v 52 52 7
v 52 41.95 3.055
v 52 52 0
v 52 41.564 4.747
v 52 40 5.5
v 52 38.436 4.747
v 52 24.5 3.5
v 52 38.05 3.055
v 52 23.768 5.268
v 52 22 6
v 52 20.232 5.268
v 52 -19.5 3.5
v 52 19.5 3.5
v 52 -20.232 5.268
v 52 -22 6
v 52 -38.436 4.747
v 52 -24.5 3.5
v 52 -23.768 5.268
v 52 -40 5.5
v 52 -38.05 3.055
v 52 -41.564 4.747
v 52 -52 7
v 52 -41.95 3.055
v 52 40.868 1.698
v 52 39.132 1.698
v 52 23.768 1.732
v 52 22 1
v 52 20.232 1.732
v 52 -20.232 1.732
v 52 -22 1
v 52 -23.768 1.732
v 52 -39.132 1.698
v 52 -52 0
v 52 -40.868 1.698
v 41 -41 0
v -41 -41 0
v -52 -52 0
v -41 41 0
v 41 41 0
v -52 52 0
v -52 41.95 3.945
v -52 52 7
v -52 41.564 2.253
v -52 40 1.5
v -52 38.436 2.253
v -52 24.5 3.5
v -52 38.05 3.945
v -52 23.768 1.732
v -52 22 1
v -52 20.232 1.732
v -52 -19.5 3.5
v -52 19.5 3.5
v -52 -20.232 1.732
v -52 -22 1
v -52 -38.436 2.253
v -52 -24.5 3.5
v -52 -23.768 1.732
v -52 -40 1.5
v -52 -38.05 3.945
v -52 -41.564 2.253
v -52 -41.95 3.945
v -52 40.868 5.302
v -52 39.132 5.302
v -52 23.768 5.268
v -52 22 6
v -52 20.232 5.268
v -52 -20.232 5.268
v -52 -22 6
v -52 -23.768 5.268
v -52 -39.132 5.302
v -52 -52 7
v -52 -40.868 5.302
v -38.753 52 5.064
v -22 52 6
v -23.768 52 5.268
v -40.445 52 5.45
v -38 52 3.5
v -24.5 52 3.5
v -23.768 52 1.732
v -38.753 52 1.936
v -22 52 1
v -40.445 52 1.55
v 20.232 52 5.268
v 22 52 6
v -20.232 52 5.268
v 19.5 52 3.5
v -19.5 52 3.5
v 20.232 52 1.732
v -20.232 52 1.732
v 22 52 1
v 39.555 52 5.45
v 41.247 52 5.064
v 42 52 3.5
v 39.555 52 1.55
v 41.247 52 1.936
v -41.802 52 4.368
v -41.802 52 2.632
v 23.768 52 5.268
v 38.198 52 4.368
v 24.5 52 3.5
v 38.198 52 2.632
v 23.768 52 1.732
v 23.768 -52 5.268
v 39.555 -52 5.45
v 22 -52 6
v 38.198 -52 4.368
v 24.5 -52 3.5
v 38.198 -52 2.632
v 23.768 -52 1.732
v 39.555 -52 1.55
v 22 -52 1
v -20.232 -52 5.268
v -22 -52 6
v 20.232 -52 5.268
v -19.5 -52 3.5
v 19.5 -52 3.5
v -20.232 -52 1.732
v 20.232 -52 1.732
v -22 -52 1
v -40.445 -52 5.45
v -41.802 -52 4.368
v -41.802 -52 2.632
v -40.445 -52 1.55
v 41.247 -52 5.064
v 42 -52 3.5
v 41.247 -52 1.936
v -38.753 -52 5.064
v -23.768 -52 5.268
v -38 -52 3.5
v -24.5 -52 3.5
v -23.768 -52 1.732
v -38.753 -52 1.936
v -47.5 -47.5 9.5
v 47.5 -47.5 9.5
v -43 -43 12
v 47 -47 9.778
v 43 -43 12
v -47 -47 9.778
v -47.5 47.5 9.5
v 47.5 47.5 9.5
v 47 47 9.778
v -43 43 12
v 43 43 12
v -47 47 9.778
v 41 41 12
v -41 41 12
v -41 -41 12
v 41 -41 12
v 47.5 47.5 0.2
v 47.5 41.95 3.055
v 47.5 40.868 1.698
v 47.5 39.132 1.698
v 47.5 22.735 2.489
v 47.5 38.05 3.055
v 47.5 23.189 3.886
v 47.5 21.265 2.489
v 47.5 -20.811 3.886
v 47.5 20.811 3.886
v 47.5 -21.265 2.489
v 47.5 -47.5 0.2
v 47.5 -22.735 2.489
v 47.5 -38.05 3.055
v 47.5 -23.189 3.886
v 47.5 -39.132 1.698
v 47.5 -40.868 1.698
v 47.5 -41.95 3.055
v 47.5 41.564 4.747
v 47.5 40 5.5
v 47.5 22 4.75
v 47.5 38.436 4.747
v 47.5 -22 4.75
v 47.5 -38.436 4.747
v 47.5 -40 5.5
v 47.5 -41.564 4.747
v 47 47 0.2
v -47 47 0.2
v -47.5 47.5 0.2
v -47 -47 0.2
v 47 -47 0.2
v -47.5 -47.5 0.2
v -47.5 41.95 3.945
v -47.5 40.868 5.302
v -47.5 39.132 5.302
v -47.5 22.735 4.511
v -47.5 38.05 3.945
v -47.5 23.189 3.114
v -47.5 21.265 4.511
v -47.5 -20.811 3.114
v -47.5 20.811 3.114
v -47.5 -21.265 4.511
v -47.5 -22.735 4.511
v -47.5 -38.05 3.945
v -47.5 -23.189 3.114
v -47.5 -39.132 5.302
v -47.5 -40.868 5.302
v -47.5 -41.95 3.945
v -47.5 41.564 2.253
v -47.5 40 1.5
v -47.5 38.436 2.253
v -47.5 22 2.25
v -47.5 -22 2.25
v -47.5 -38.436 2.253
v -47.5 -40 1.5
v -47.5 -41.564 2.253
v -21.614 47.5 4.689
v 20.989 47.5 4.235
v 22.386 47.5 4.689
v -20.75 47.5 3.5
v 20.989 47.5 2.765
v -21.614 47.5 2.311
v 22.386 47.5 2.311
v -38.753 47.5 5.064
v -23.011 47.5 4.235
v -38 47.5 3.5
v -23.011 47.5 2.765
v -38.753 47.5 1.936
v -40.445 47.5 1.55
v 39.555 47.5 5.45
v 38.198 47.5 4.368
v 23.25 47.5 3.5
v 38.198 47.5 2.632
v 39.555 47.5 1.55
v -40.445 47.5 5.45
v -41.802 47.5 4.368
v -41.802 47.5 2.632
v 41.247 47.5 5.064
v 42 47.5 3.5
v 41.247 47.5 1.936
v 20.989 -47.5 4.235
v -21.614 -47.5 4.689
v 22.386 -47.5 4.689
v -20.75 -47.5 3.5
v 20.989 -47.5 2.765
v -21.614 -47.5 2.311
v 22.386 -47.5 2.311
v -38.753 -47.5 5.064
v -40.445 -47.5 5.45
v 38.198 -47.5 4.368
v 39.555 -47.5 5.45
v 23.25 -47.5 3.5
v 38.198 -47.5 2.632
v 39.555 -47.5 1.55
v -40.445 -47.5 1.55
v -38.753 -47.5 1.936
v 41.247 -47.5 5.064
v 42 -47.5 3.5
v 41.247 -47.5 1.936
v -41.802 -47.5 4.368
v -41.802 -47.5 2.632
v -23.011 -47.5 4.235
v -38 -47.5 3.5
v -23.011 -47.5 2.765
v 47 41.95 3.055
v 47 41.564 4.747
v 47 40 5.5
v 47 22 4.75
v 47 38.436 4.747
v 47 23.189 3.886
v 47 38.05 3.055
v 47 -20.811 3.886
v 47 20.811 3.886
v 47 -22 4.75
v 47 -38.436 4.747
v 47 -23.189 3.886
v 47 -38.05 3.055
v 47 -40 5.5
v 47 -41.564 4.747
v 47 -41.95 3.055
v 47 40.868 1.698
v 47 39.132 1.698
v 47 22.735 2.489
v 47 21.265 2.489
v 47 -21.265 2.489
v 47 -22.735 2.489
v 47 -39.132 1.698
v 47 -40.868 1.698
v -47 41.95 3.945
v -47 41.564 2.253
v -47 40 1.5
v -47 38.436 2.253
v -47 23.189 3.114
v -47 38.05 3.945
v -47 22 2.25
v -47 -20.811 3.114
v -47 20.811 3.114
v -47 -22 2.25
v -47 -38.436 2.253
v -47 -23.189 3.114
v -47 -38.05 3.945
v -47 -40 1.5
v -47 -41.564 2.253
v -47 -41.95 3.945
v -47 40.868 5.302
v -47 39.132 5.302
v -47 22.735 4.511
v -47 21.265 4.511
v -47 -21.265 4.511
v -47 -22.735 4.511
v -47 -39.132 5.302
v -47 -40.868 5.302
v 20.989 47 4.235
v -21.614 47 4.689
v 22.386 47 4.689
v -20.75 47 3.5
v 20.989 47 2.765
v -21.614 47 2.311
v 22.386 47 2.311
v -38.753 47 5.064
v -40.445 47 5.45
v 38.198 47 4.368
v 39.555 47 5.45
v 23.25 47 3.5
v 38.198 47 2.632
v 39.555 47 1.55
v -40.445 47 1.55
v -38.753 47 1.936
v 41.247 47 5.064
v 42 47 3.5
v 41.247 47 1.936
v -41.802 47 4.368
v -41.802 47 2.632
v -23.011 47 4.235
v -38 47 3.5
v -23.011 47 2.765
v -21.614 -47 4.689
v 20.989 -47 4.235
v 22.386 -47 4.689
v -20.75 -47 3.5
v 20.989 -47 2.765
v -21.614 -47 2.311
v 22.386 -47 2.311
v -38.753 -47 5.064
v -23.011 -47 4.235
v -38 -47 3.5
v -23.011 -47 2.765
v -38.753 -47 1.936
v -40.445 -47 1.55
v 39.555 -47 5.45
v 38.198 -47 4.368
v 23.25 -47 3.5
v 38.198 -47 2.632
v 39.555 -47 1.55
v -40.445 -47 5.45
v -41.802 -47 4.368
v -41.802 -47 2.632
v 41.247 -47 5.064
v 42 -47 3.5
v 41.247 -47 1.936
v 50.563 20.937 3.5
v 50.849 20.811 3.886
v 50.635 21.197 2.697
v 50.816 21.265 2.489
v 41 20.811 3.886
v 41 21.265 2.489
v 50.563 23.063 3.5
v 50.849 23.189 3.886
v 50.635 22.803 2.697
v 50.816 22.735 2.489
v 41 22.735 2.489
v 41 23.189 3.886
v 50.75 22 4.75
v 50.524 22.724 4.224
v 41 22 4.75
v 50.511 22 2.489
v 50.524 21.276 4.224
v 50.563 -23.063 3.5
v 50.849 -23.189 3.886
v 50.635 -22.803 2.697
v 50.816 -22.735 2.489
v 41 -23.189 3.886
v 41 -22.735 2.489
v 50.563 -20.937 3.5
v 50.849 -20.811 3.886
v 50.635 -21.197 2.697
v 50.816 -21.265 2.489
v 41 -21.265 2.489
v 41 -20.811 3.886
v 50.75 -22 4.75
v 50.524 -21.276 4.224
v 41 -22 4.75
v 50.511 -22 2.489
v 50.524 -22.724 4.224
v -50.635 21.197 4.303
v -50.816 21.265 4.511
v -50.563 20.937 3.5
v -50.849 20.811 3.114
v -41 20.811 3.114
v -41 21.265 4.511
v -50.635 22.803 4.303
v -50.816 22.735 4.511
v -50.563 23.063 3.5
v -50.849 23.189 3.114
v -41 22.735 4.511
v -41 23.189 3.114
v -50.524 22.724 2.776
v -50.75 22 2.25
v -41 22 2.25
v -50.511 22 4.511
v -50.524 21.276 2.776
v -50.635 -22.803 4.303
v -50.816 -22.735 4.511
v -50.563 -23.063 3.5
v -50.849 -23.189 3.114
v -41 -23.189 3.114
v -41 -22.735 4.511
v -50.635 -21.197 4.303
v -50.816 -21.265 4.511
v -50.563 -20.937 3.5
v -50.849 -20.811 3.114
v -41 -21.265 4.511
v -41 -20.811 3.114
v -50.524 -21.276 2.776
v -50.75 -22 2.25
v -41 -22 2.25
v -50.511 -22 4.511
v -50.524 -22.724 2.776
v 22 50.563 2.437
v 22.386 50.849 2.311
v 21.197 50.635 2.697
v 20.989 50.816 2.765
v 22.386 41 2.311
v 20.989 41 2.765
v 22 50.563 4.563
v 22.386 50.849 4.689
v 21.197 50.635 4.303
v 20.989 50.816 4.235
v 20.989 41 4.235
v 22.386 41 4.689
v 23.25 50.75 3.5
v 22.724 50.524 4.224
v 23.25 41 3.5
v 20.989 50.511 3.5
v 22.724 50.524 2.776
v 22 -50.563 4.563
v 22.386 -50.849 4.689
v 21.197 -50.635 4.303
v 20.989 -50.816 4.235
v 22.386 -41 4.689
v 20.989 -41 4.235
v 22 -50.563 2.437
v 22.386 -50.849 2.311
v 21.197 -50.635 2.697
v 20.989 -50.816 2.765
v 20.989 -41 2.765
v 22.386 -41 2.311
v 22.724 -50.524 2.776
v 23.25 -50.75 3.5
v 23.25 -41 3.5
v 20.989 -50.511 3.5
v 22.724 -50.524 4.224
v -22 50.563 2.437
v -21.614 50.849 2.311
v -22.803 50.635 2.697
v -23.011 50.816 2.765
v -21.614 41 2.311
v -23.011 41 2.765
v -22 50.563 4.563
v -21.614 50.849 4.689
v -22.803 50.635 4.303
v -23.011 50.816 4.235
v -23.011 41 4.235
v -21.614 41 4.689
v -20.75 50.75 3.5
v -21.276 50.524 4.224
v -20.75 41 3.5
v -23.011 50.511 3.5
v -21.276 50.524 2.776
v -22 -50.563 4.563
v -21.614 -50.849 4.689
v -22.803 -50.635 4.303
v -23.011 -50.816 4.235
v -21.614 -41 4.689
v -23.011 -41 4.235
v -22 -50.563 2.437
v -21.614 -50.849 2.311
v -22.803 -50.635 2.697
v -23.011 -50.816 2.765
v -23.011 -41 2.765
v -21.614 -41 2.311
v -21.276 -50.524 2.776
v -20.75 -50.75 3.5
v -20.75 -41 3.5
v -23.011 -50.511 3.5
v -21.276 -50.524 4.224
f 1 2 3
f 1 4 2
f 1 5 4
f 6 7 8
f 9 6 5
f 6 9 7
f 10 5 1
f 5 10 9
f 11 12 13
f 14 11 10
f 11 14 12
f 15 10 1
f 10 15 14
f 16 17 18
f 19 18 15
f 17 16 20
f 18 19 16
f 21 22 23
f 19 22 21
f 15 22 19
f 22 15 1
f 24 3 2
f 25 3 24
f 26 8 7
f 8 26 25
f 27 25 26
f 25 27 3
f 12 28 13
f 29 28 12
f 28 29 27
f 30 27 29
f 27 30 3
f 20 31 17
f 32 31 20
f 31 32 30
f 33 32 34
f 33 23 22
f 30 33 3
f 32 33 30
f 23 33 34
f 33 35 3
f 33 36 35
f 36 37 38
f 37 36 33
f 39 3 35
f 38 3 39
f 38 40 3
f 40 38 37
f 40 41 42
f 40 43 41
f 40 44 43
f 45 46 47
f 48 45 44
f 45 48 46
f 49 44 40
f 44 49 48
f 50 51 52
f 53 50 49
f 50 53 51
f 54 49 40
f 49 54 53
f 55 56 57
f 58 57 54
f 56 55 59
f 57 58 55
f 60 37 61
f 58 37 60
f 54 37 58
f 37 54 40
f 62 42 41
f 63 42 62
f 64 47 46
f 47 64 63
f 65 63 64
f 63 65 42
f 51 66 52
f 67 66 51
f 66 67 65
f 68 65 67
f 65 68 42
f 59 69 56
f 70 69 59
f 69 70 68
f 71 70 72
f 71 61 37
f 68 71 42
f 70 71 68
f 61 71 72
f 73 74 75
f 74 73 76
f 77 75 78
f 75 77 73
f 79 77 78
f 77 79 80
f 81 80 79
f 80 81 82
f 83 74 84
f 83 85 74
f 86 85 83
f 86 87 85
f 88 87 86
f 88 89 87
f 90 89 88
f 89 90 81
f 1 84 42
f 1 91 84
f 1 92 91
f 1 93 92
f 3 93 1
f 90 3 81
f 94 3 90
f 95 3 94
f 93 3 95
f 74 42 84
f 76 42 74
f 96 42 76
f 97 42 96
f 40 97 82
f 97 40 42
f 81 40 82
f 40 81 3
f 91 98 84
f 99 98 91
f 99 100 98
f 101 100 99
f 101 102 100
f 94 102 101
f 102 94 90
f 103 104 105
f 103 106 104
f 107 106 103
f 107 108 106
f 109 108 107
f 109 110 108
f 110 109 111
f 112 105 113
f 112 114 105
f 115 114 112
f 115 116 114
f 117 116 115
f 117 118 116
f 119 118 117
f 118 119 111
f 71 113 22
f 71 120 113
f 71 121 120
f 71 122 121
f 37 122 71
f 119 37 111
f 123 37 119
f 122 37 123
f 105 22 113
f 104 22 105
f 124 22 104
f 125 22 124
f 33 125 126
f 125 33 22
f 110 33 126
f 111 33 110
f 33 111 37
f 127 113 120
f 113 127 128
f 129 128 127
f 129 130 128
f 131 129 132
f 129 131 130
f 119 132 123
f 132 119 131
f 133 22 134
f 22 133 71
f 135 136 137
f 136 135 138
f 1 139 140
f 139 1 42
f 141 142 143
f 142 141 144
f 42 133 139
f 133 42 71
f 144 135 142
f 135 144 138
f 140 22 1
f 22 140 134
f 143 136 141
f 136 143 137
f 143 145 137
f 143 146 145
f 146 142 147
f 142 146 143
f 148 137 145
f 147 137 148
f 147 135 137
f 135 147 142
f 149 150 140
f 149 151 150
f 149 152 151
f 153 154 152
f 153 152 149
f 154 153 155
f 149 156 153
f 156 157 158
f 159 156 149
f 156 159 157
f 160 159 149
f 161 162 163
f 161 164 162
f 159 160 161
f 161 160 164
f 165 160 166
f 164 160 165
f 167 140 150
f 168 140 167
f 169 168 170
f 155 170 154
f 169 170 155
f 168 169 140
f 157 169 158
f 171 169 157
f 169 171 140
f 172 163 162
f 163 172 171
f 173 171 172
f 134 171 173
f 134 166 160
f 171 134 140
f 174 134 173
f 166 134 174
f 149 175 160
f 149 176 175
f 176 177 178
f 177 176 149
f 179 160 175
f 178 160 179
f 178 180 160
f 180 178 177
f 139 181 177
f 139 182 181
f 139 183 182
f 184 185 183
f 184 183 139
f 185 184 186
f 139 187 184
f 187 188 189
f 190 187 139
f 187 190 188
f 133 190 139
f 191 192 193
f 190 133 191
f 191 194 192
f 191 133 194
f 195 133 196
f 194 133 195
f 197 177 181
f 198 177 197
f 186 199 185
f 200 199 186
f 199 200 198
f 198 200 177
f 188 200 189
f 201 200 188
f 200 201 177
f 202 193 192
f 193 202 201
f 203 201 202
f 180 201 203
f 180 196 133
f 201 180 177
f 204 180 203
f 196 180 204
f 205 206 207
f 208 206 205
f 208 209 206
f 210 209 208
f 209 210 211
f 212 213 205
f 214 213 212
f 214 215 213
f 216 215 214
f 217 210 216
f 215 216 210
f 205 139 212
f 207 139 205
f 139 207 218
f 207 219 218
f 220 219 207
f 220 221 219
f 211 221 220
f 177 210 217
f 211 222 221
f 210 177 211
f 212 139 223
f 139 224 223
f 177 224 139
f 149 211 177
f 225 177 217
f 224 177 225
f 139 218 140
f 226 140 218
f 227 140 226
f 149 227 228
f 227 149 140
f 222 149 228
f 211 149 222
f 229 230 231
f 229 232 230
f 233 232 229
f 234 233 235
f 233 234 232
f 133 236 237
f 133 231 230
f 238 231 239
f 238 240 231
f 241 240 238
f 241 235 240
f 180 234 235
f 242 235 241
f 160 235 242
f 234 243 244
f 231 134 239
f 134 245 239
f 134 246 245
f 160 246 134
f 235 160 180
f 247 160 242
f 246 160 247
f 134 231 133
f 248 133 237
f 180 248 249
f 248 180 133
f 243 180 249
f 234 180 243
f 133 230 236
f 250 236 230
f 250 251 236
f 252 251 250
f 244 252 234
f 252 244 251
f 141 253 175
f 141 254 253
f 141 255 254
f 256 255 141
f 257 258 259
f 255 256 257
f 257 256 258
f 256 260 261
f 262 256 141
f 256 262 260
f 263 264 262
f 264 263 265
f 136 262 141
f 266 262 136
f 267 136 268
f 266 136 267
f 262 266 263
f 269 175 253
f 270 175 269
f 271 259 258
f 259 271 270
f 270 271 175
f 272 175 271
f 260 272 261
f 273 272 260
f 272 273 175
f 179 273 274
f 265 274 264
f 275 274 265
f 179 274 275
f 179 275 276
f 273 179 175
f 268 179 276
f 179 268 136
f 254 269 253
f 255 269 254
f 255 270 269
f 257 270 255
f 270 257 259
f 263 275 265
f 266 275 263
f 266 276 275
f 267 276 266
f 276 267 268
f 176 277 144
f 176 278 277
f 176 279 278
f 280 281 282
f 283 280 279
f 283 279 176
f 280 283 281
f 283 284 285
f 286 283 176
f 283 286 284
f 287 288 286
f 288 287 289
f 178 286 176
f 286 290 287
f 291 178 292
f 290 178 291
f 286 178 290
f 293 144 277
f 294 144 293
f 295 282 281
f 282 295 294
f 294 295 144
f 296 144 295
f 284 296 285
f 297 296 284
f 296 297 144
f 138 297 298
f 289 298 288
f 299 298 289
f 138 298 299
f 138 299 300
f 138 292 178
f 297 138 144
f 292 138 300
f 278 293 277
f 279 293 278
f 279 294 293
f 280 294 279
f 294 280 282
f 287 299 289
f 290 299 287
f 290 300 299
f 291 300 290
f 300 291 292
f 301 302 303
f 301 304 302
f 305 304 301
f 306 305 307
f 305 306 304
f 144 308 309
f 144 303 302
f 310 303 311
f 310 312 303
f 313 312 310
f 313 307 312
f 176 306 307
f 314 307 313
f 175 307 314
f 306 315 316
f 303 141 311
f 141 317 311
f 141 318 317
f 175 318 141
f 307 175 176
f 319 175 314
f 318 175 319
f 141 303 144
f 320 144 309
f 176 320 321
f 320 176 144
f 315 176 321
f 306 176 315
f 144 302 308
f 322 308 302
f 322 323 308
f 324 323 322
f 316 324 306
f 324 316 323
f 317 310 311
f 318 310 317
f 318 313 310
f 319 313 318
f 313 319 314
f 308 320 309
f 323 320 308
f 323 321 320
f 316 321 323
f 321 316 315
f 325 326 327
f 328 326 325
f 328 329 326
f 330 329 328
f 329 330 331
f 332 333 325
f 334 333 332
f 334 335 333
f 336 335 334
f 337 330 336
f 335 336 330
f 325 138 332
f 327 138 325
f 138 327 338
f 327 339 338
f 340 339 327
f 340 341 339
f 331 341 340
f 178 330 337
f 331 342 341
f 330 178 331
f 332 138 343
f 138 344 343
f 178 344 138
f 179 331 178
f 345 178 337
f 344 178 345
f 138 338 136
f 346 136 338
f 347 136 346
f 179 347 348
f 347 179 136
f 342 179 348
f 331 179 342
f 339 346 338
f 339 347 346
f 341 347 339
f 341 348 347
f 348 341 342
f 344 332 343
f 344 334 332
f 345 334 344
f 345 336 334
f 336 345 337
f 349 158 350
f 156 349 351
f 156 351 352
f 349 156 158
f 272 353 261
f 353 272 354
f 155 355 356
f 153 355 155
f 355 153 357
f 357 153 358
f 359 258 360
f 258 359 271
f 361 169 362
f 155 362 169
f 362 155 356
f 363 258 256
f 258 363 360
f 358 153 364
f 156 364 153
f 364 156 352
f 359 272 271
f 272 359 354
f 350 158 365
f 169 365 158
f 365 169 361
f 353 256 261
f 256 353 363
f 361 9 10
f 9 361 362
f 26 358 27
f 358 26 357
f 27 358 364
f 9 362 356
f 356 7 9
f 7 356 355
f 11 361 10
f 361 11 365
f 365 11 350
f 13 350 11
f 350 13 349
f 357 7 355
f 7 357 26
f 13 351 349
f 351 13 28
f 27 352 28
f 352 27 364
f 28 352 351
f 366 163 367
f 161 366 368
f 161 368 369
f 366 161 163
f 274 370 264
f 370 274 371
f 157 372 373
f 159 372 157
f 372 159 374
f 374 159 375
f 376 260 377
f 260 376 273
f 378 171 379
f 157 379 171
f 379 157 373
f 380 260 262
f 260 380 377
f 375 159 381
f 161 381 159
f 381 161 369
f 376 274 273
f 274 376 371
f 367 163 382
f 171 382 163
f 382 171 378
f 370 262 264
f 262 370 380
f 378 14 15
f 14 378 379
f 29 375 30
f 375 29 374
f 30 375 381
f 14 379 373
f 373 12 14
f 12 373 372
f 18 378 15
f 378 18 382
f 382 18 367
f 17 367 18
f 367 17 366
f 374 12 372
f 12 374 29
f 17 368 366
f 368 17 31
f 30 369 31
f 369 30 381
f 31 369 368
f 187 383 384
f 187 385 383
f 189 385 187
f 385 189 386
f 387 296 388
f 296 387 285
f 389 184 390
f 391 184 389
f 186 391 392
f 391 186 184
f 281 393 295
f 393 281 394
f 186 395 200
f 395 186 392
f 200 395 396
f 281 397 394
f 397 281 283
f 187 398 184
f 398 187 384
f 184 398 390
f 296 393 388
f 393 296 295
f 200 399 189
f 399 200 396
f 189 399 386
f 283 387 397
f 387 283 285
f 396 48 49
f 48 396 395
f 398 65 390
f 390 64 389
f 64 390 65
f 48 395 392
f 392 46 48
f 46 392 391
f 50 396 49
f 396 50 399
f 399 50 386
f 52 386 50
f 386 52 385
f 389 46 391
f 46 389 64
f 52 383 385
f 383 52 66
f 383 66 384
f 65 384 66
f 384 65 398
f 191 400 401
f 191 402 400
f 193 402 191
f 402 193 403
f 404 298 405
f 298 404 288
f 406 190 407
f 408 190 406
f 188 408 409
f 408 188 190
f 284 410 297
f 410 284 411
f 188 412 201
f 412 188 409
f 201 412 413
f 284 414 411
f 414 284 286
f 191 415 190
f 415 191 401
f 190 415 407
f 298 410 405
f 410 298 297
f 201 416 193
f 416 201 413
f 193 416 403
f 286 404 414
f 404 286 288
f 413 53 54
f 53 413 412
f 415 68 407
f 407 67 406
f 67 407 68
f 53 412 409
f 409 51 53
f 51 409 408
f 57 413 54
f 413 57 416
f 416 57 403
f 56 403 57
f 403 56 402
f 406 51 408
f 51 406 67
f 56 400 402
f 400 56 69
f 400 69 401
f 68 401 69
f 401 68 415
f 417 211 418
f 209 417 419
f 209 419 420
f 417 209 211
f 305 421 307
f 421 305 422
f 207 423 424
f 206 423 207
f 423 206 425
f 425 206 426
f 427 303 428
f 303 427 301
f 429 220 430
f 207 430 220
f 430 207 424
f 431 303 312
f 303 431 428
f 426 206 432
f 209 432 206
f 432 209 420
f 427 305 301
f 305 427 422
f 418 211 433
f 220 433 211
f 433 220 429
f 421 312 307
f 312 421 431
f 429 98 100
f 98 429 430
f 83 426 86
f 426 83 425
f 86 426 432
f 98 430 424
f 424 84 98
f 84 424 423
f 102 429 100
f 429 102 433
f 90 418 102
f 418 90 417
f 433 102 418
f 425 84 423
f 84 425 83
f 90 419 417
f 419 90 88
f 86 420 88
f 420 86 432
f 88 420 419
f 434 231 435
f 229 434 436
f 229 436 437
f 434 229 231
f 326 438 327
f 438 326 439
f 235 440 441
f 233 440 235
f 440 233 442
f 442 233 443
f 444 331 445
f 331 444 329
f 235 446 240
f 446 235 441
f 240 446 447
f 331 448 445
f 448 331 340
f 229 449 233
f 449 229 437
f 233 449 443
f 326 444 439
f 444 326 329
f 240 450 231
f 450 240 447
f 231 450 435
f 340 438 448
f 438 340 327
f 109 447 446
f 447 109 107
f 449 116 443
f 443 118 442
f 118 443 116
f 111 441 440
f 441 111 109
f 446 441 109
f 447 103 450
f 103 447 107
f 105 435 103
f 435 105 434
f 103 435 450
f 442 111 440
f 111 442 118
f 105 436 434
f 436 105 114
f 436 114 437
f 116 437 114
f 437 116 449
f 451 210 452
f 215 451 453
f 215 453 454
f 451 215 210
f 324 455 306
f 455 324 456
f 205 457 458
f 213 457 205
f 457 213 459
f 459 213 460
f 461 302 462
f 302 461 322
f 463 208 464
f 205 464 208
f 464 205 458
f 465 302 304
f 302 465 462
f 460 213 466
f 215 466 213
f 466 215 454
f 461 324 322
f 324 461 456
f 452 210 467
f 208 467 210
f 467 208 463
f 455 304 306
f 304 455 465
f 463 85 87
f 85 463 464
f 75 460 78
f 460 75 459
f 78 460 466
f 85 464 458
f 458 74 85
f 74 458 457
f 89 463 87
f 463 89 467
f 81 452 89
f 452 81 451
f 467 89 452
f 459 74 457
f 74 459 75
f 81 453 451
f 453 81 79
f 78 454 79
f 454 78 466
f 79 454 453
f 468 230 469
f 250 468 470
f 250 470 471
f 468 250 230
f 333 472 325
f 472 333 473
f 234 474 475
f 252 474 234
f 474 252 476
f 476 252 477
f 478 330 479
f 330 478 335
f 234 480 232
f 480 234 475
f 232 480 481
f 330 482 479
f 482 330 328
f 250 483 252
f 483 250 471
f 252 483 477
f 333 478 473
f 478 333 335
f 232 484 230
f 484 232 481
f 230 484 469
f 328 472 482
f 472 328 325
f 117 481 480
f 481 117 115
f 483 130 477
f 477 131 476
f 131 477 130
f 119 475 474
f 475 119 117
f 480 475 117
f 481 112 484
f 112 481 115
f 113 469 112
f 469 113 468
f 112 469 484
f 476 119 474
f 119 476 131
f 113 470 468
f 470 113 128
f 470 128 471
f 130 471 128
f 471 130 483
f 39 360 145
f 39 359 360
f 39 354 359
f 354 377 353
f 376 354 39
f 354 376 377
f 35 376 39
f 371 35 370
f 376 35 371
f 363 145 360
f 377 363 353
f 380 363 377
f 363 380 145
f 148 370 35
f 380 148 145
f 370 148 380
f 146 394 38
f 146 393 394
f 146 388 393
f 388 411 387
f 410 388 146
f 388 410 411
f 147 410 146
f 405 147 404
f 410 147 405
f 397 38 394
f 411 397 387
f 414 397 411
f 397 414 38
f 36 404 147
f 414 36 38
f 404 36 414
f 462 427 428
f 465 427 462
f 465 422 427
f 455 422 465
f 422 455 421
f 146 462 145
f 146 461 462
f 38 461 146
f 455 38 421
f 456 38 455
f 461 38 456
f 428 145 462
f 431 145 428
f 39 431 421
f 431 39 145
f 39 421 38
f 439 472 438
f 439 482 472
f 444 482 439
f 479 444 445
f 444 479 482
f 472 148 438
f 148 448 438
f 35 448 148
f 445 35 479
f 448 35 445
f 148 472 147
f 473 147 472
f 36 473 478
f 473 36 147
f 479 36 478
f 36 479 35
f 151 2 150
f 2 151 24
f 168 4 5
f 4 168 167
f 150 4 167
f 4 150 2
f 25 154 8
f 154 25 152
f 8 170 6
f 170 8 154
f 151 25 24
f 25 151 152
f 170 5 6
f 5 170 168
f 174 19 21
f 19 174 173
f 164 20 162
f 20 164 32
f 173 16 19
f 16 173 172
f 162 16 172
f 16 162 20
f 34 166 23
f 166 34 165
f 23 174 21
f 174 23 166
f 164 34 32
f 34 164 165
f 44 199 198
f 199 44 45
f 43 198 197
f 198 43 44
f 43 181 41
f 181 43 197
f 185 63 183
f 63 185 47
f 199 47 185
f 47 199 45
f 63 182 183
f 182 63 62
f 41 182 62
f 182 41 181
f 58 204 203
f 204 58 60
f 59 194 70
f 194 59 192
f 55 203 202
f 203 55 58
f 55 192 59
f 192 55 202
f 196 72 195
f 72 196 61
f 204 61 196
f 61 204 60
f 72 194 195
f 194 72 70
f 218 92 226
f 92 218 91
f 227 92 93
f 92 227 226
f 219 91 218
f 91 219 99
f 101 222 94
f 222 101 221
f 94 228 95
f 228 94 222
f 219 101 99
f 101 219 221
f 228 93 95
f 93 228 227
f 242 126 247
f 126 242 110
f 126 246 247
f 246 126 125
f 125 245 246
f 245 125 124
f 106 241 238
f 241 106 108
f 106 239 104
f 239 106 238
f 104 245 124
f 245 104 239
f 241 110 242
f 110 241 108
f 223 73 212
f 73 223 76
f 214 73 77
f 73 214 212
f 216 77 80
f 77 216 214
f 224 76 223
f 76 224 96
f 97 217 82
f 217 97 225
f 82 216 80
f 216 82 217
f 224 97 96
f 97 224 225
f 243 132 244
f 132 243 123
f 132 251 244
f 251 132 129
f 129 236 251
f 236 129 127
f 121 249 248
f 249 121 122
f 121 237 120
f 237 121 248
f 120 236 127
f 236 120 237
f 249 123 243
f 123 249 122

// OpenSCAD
// file: config_4x5.scad
/*
This is the base configuration file for the 4x5" format
# we are not using the exact ANSI measures, but slightly rounded measures for slight simplification
*/
vStabilizerTotal_h = 7;

// general tolerance
vTolerance = 0.2;

// sheet film and cassette measurements (roughly based on the ANSI measurements)
vFilmSheet_l = 127;
vFilmSheet_w = 102;
vCassette_l = 160; // A min
vCassette_w = 121; // B max
vCassette_h = 13.2; // C max
vLightTrap_l = 2; // M2
vLightTrap_w = vCassette_w;
vLightTrap_h = 1.5; // M1
vLightTrap_offsetX = 141; // G max
vFilmWindow_l = 121;
vFilmWindow_w = 101;
vFilmWindow_offsetX = 16;
vGroundGlass_offsetZ = 5;

// Graflok
vGraflok_h = 6; // this is not the official measurement, just measured from a camera 

// lens board measures (we are using Wista/Technika-style lensboards)
vLensboard_l = 100;
vLensboard_w = 97;
vLensboard_h = 2;
vLensboard_offsetX = -(vLensboard_l+3)/2; // caution: we have an asymetric offset!
vLensboard_offsetY = -vLensboard_w/2;
vLensboardHole_d = 85;
vLensboardLighttrap_d = 89;
vLensboardLighttrap_h = 1+vTolerance;

// bellows frame measures - the bellows frame design is derived from standardcameras.com
// back frame
vBellowsBackInner_l = 144; //???? check and replace with the measurement from your bellows!
vBellowsBackInner_w = vBellowsBackInner_l;
vBellowsBackOuter_l = vBellowsBackInner_l+1;
vBellowsBackOuter_w = vBellowsBackOuter_l;

vBellowsBackFrameOuter_l = 159;
vBellowsBackFrameOuter_w = vBellowsBackFrameOuter_l;
vBellowsBackFrameOuter_h = 7;
vBellowsBackFrameInner_l = 135;
vBellowsBackFrameInner_w = vBellowsBackFrameInner_l;
vBellowsBackFrameInner_h = 5;

vBellowsBackLightTrapOuter_l = vBellowsBackFrameInner_l+2*2;
vBellowsBackLightTrapOuter_w = vBellowsBackLightTrapOuter_l;
vBellowsBackLightTrap_h = 3;

//vBellowsBackFrameScrewHole_d = 2;
//vBellowsBackFrameScrewHole_h = 10;
vBellowsBackFrameScrewHole_offsetXY = 70;
vBellowsBackFrameScrewHole_offsetZ = vBellowsBackFrameOuter_h/2;

// front frame
vBellowsFrontInner_l = 94; //???? check and replace with the measurement from your bellows!
vBellowsFrontInner_w = vBellowsFrontInner_l;
vBellowsFrontOuter_l = vBellowsFrontInner_l+1;
vBellowsFrontOuter_w = vBellowsFrontOuter_l;

vBellowsFrontFrameOuter_l = 104;
vBellowsFrontFrameOuter_w = vBellowsFrontFrameOuter_l;
vBellowsFrontFrameOuter_h = 7;
vBellowsFrontFrameInner_l = 82;
vBellowsFrontFrameInner_w = vBellowsFrontFrameInner_l;
vBellowsFrontFrameInner_h = 5;

vBellowsFrontLightTrapOuter_l = vBellowsFrontFrameInner_l+2*2;
vBellowsFrontLightTrapOuter_w = vBellowsFrontLightTrapOuter_l;
vBellowsFrontLightTrap_h = 0;

//vBellowsFrontFrameScrewHole_d = 2;
//vBellowsFrontFrameScrewHole_h = 10;
vBellowsFrontFrameScrewHole_offsetXY = 40;
vBellowsFrontFrameScrewHole_offsetZ = vBellowsFrontFrameOuter_h/2;

// body dimensions
vWall_strength = 5;
vBodyOuter_l = 185; // make sure this is at least 4*vWall_strength larger than vBellowsBackFrameOuter_l!
vBodyOuter_w = 170; // make sure this is at least 2*vWall_strength larger than vBellowsBackFrameOuter_l!
vBodyOuter_h = 65;
vBodyEdge_r = vWall_strength;

// we will center our model on the Y axis and on the center of the bellows frame
// at least for the 4x5 version, we have to do an asymetric offset of 2.5mm on the X-axis 
vAsymOffsetX = -2.5;  

// back plate
vBackPlateLength = 160; // we will probably use about the same size as the bellows back frame
vBackPlateStrength = vWall_strength;

// hinges for front lid
vHingeInnerDistance = 100;
vHingeBaseWidth = 20;
vHingeHole = 5;

// lid lock measures
vLidLockBase_d = 8;
vLidLockHole_distance = 70;

// rail dimensions
vLowerRail_w = 90;
vUpperRail_w = vLowerRail_w;

// cutout for stop indents
vStopIndent_l = 4;
vStopIndent_h = 5;
vStopIndentDistance = 25; // shorter than 25 is not necessary
vStopIndent_offsetX = 20; // don't go shorter than 20 if you intend to use a 90mm lens!

// for all dovetails we use a base width of 5mm and a base height of 5mm
// we are applying tolerances to the inner AND outer part of a dovetail, in width and height
vDoveTail_w = 5;
vDoveTail_h = 5;
vDoveTail_tolerance = 0.2;

// front standard carrier / slider
// width is depending on vUpperRail_w
vSliderBase_w = vUpperRail_w + (4*vDoveTail_w);
vSliderBase_l = 40; // make sure to have enough space in the body.


// lever plate 
vLeverPlateBase_w = vUpperRail_w - (8*vDoveTail_w);
vLeverPlateBlock_w = 25;
vLeverPlateBlock_l = vSliderBase_l-(2*vDoveTail_w);

vFrontStandard_h = 130;
vFrontStandardSlot_h = vFrontStandard_h - 30;

// lensboard carrier
vFrontPlate_length = vSliderBase_w+6; // vSliderBase_w is a bit too tight for 4x5", so there we will add 5mm, for 5x7 vSliderBase_w is OK to get a squared lensboard carrier
vFrontPlate_width = vSliderBase_w; //vFrontPlate_length;
vFrontPlate_height = 16;
vEdgeCutCylinder = floor(sqrt(2*pow(vFrontPlate_width,2)))-5;

vTiltDovetailBase_d1 = 30;
vTiltDovetailBase_d2 = vTiltDovetailBase_d1+(2*vDoveTail_w);
vTiltDovetailBaseBlock_d = vTiltDovetailBase_d1+(4*vDoveTail_w);

vTiltDovetail_d1 = vTiltDovetailBase_d1-vTolerance;
vTiltDovetail_d2 = vTiltDovetailBase_d2-vTolerance;
vTiltDovetail_h = vDoveTail_w-vTolerance;

vTiltDovetailCutout_d1 = vTiltDovetailBase_d2+vTolerance;
vTiltDovetailCutout_d2 = vTiltDovetailBase_d1+vTolerance;

vAxisHole_d = 10+vTolerance;
vAxisHole_h = vDoveTail_w+vTolerance;

vTiltLockBolt_d = 12;
vTiltLockBolt_h = 14;
vTiltLockBoltHole_d = 8;
vTiltLockBoltHole_h = vTiltLockBolt_h;

vTiltHeight = 50;
vTiltRadius = vFrontPlate_length/2;
vTiltAngleMinus = -7;
vTiltAnglePlus = 7;
vTiltAxis_d = 10-vTolerance;

// focusing rod
vFocusingRod_d = 6;
vFocusingKnob_d = 25;
vFocusingKnob_h = 20;

// stabilizer measures (just the outer measures of our stabilizer block, not the tripod slider)
vStabilizerBase_l = 135;
vStabilizerBase_w = 90;  
vStabilizerBase_h = 7;
vStabilizerDovetailBase_w = 50;
// screw holes for the stabilizer
vLidHoleCount_x = 4;
vLidHoleDist_x = 35;
vLidHoleCount_y = 2;
vLidHoleDist_y = 60;


// screw diameters, length is individually set
vScrew1Hole_d = 3;
vScrew1ThreadHole_d = 2.2;
vScrew2Hole_d = 2;
vScrew2ThreadHole_d = 1.4;


// Dimensions for heat set insert holes.
// Sized for "Voron standard" M3 inserts, 4 mm depth, 5 mm max OD
// (variously labelled M3x4x5 or M3x5x4)
vInsertHole_d = 4.0;
vInsertMinDepth_h = 5.0;

// Dimensions for small heat set insert holes.
// Sized for M2 inserts, 4 mm depth, 3.5 mm max OD
// (may be labelled M2x3.5x4)
vInsertHoleSmall_d = 3.1;
vInsertMinDepthSmall_h = 4.0;

// Dimensions for large heat set insert holes.
// Sized for M5 inserts, 5 mm depth, 7 mm max OD
// (may be labelled M5x7x5)
vInsertHoleLarge_d = 6.6;
vInsertMinDepthLarge_h = 5.5;
// file: modules.scad
/*
This is a collection of the modules which are used heavily within the whole project.
Almost all parts rely on the modules to remain "as is", especially regarding their current orientation.
So please act very carefully here, otherwise you may screw up the complete design!

*/
include <baseconfig.scad>;


// roof module - this is heavily used for dovetail cutouts
// please keep as is
module roof(l, w, h){
    polyhedron(
        points=[
            [0,0,0],
            [l,0,0],
            [l,w,0],
            [0,w,0],
            [0,w/2,h],
            [l,w/2,h]
            ],
        faces=[
            [0,1,2,3],
            [0,4,1],
            [1,4,5,2],
            [2,5,3],
            [3,5,4,0]
            ]
            );
    };

// a wedge module - this is heavily used for cutting edges
// please keep as is    
module wedge(l, w, h) {
    polyhedron(
            points=[
                [0,0,0],
                [l,0,0],
                [l,w,0],
                [0,w,0],
                [0,0,h],
                [l,0,h]
            ],
            faces=[
                [0,3,2,1],
                [0,1,5,4],
                [1,2,5],
                [2,3,4,5],
                [3,0,4]
            ]
    );
   };

// simple tube module.   
module tube(d1, d2, h) {
    difference() {
        cylinder(d=d1, h=h);
        cylinder(d=d2, h=h);
        };
    };

// mainly used for making holes for countersunk screws
// please keep as is    
module countersunk_screw(vScrew_d, vScrew_l){
    union(){
    cylinder(d=vScrew_d, h=vScrew_l);
    cylinder(d1=vScrew_d*2, d2=0, h=vScrew_d);
    };
};

// module for making hexagons, e.g. hex nuts. kw is the key width
// please keep as is
module hex(kw, h) {
	render()
        translate([0, 0, h/2])
            intersection_for(a = [0, 120, 240]) {
                rotate([0, 0, a])
                    cube([kw, 3 * kw, h], true);
                }
}


// Heatset insert
// d: Thread diameter
// od: Outer diameter
// l: Total length
module insert(d, od, l)
{
    echo(Insert = d, od, l);
    difference() {
        cylinder(l, d=od, $fn=15);
        translate([0, 0, -0.5]) cylinder(l+1, d=d, $fn=15);
        };
}

module insert_m2()
{
    color("gold") insert(2, vInsertM2Size_d, vInsertM2Depth_h);
}

module insert_m3()
{
    color("gold") insert(3, vInsertM3Size_d, vInsertM3Depth_h);
}

module insert_m5()
{
    color("gold") insert(5, vInsertM5Size_d, vInsertM5Depth_h);
}

// Countersunk screw, metric, for display
// Example: https://www.aliexpress.com/item/1005007838338973.html
module screw_cs(l, d=3, dk=6, s=2, t=1) {
    // l: total length (including head) in mm
    // d: thread diameter (eg 3 for M3)
    // dk: max head diameter
    // s: hex socket flat-to-flat size
    // t: hex socket depth
    echo(CountersunkScrew = d, l);
    difference() {
        union() {
            cylinder(h=l, r=d/2, $fn=15);
            cylinder(h=(dk-d)/2, r1=dk/2, r2=d/2, $fn=15);
            }
        cylinder(h=t, r=s/2*2/sqrt(3), $fn=6);
    }
}

module screw_m3_cs(l) {
    color("silver") screw_cs(l, d=3, dk=6, s=2, t=1);
}

module screw_m2_cs(l) {
    color("silver") screw_cs(l, d=2, dk=3.8, s=1.5, t=0.75);
}
module screw_m5_cs(l) {
    color("silver") screw_cs(l, d=5, dk=9.5, s=3, t=1.6);
}

// Button head screw, metric, for display
// Example: https://www.aliexpress.com/item/32967225441.html
module screw_bh(l, d=3, k=1.5, dk=5.5, s=2, t=1) {
    // l: shaft length (NOT including head) in mm
    // d: thread diameter (eg 3 for M3)
    // k: head depth
    // dk: head max diameter
    // s: hex socket flat-to-flat size
    // t: hex socket depth
    echo(BallheadScrew = d, l);
    difference() {
        union() {
            translate([0, 0, k]) cylinder(h=l, r=d/2, $fn=15);
            difference() {
                translate([0, 0, k]) intersection() {
                    sphere(d=dk, $fn=15);
                    translate([-dk/2, -dk/2, -dk]) cube(dk);
                }
                translate([-dk/2, -dk/2, -dk]) cube(dk);
            }
        }
        cylinder(h=t, r=s/2*2/sqrt(3), $fn=6);
    }
}

module screw_m2_bh(l) {
    color("silver") screw_bh(l, d=2, dk=3.4, s=1.175, t=0.6);
}

module screw_m3_bh(l) {
    color("silver") screw_bh(l, d=3, dk=5.7, s=2, t=1);
}


module nut_m5() {
    echo(Nut = 5);
    difference() {
        rotate([0, 0, 30]) cylinder(h=3.9, d=8*2/sqrt(3), $fn=6);
        cylinder(h=5, d=5, $fn=15);
        }
    }
    
    
module thumbscrew(bolt_d, bolt_dk, screw_d, screw_h, n_knurls, knurl_d, knurl_f) {
    // bolt_d:  central bolt diameter
    // bolt_dk: bolt head max diameter
    // screw_d: thumbscrew outer diameter
    // screw_h: thumbscrew height
    // n_knurls: number of knurls
    
    min_knurl_offset = screw_d/2 - knurl_d;
    max_knurl_offset = screw_d/2 + knurl_d;
    knurl_offset = min_knurl_offset + knurl_f*(max_knurl_offset - min_knurl_offset);
    
    difference()
    {
        union()
        {
            translate([0, 0, 1]) cylinder(screw_h-2, d=screw_d);
            cylinder(1, d1=screw_d-1, d2=screw_d);
            translate([0, 0, screw_h-1]) cylinder(1, d1=screw_d, d2=screw_d-1);
        }
        cylinder(screw_h, d=bolt_d);
        cylinder(bolt_dk/2, d1=bolt_dk, d2=0);
        for (i = [1:n_knurls])
        {
            rotate([0, 0, i*360/(n_knurls)]) translate([knurl_offset, 0, 0]) cylinder(screw_h, d=knurl_d);
        }
    }
}

module thumbscrew_m5(screw_d, screw_h, n_knurls, knurl_d, knurl_f) {
    thumbscrew(5, 9.5, screw_d, screw_h, n_knurls, knurl_d, knurl_f);
}


module t6_flange_coupler() {
    // T6 flange coupler
    // Example: https://www.aliexpress.com/item/1005008049363389.html
    echo(FlangeCoupler = 6);
    difference() {
        union() {
            translate([0, 0, 2]) cylinder(h=10, d=10);
            cylinder(h=2, d=22);
        }
        cylinder(h=12, d=6);
        translate([0, 15, 7]) rotate([90, 0, 0]) cylinder(h=30, d=3);
        for (i = [0:3]) {
            rotate([0, 0, 45+90*i]) translate([-8, 0, 0]) cylinder(h=2, d=3);
        }
    }
}


module AXK0619_thrust_bearing() {
    echo(ThrustBearing = "AXK0619");
    difference() {
        cylinder(h=4, d=19);
        cylinder(h=4, d=6);
    }
}


module t6_lead_screw(l) {
    echo(LeadScrewT6 = l);
    color("silver") cylinder(h=l, d=6);
}

module t6_lead_screw_nut() {
    echo("LeadScrewT6Nut");
    intersection()
    {
        difference() {
            union() {
                cylinder(h=15, d=12);
                translate([0, 0, 1.5]) cylinder(h=3.5, d=24);
            }
            cylinder(h=15, d=6);
        }  
        translate([-50, -12.5/2, -50]) cube([100, 12.5, 100]);
    }
}

module m5_rod(l) {
    echo(ThreadedRodM5 = l);
    color("silver") cylinder(h=l, d=5);
}


module screw_m3_grub(l) {
    echo(GrubScrew = 3, l);
    cylinder(h=l, d=3, $fn=15);
}
// file: baseconfig.scad
/*
Here we define some variables which are independent from the camera format
*/


// some generic variables

// we are including a format specific configuration sheet - but make sure to include only one!

include <config_4x5.scad>;
// include <config_5x7.scad>;
// include <config_8x10.scad>;

// Arca Swiss tripod plate
// caution: some Arca Swiss compatible tripod heads may have slight variations
// vArca_length = xx; // the length is irrelevant here
vArca_width = 38;
vArca_height = 7;
vArcaBase_cutout = 4;
vArcaBase_height = 1.5;
// main file
// loading the base configuration
include <baseconfig.scad>;

// some modules such as hex, countersunk screws, roof, wedge are available in a module file
use <modules.scad>;

module bellows_front_frame() {

// we are centering our cube
vLowerCube_l = vBellowsFrontFrameOuter_l;
vLowerCube_w = vLowerCube_l;
vLowerCube_h = vBellowsFrontFrameOuter_h;
vLowerCube_offsetX = -vLowerCube_l/2;
vLowerCube_offsetY = -vLowerCube_w/2;
vLowerCube_offsetZ = 0;

// we build our pyramid as cone with 4 segments
vMiddlePyramid_d1 = sqrt(2*pow(vBellowsFrontFrameOuter_l,2));
vMiddlePyramid_d2 = sqrt(2*pow(vBellowsFrontLightTrapOuter_l,2));
vMiddlePyramid_h = vBellowsFrontFrameInner_h;
vMiddlePyramid_offsetX = 0;
vMiddlePyramid_offsetY = 0;
vMiddlePyramid_offsetZ = vLowerCube_h;

vUpperCube_l = vBellowsFrontLightTrapOuter_l;
vUpperCube_w = vBellowsFrontLightTrapOuter_w;
vUpperCube_h = vBellowsFrontLightTrap_h;
vUpperCube_offsetX = -vUpperCube_l/2;
vUpperCube_offsetY = -vUpperCube_w/2;
vUpperCube_offsetZ = vLowerCube_h+vMiddlePyramid_h;

vInnerCutout_l = vBellowsFrontFrameInner_l;
vInnerCutout_w = vBellowsFrontFrameInner_l;
vInnerCutout_h = vLowerCube_h+vMiddlePyramid_h+vUpperCube_h;
vInnerCutout_offsetX = -vInnerCutout_l/2;
vInnerCutout_offsetY = -vInnerCutout_w/2;
vInnerCutout_offsetZ = 0;

vSplitCutoutOuter_l = vBellowsFrontOuter_l;
vSplitCutoutOuter_w = vBellowsFrontOuter_w;
vSplitCutoutOuter_h = vInnerCutout_h;
vSplitCutoutOuter_offsetX = -vSplitCutoutOuter_l/2;
vSplitCutoutOuter_offsetY = -vSplitCutoutOuter_w/2;
vSplitCutoutOuter_offsetZ = 0.2;

vSplitCutoutInner_l = vBellowsFrontInner_l;
vSplitCutoutInner_w = vBellowsFrontInner_w;
vSplitCutoutInner_h = vInnerCutout_h;
vSplitCutoutInner_offsetX = -vSplitCutoutInner_l/2;
vSplitCutoutInner_offsetY = -vSplitCutoutInner_w/2;
vSplitCutoutInner_offsetZ = 0.2;

vBellowsScrew_d = 2.5;
vBellowsScrew_h = 20;
vBellowsScrew_offsetX = (vLowerCube_l)/2;
vBellowsScrew_offsetY = (vLowerCube_l)/2-30;
vBellowsScrew_offsetZ = vLowerCube_h/2;

// screw holes for fixing the whole frame in the body
vBellowsFrontFrameScrewHole_offsetX = (vLowerCube_l)/2;
vBellowsFrontFrameScrewHole_offsetY = vBellowsFrontFrameScrewHole_offsetXY;

vBellowsFrontFrameScrewHole_d=vInsertHole_d;
vBellowsFrontFrameScrewHole_h=vInsertMinDepth_h;

difference(){
    union(){
        // lower cube
        translate([vLowerCube_offsetX, vLowerCube_offsetY, vLowerCube_offsetZ])
            cube([vLowerCube_l, vLowerCube_w, vLowerCube_h]);
        
        // middle pyramid
        translate([vMiddlePyramid_offsetX, vMiddlePyramid_offsetY, vMiddlePyramid_offsetZ])
            rotate([0, 0, 45])
                cylinder(d1=vMiddlePyramid_d1, d2=vMiddlePyramid_d2, h=vMiddlePyramid_h, $fn=4);
        
        // upper cube
        translate([vUpperCube_offsetX, vUpperCube_offsetY, vUpperCube_offsetZ])
            cube([vUpperCube_l, vUpperCube_w, vUpperCube_h]);
        
        };
    
    // split cutout
    difference(){
        // split cutout outer cube
        translate([vSplitCutoutOuter_offsetX, vSplitCutoutOuter_offsetY, vSplitCutoutOuter_offsetZ])
            cube([vSplitCutoutOuter_l, vSplitCutoutOuter_w, vSplitCutoutOuter_h]);
        
        // split cutout inner cube
        translate([vSplitCutoutInner_offsetX, vSplitCutoutInner_offsetY, vSplitCutoutInner_offsetZ])
            cube([vSplitCutoutInner_l, vSplitCutoutInner_w, vSplitCutoutInner_h]);
        }

    // inner cutout cube
        translate([vInnerCutout_offsetX, vInnerCutout_offsetY, vInnerCutout_offsetZ])
            cube([vInnerCutout_l, vInnerCutout_w, vInnerCutout_h]);
        
    // inner screw holes (countersunk screws)
    // screws in x/-x direction    
    translate([vBellowsScrew_offsetX, vBellowsScrew_offsetY, vBellowsScrew_offsetZ])
        rotate([0, -90, 0])
            countersunk_screw(vBellowsScrew_d, vBellowsScrew_h);
    translate([vBellowsScrew_offsetX, -vBellowsScrew_offsetY, vBellowsScrew_offsetZ])
        rotate([0, -90, 0])
            countersunk_screw(vBellowsScrew_d, vBellowsScrew_h);
    translate([-vBellowsScrew_offsetX, vBellowsScrew_offsetY, vBellowsScrew_offsetZ])
        rotate([0, 90, 0])
            countersunk_screw(vBellowsScrew_d, vBellowsScrew_h);
    translate([-vBellowsScrew_offsetX, -vBellowsScrew_offsetY, vBellowsScrew_offsetZ])
        rotate([0, 90, 0])
            countersunk_screw(vBellowsScrew_d, vBellowsScrew_h);
    
    // screws in y/-y direction    
    translate([vBellowsScrew_offsetY, vBellowsScrew_offsetX, vBellowsScrew_offsetZ])
        rotate([90, 0, 0])
            countersunk_screw(vBellowsScrew_d, vBellowsScrew_h);
    translate([vBellowsScrew_offsetY, -vBellowsScrew_offsetX, vBellowsScrew_offsetZ])
        rotate([-90, 0, 0])
            countersunk_screw(vBellowsScrew_d, vBellowsScrew_h);
    translate([-vBellowsScrew_offsetY, vBellowsScrew_offsetX, vBellowsScrew_offsetZ])
        rotate([90, 0, 0])
            countersunk_screw(vBellowsScrew_d, vBellowsScrew_h);
    translate([-vBellowsScrew_offsetY, -vBellowsScrew_offsetX, vBellowsScrew_offsetZ])
        rotate([-90, 0, 0])
            countersunk_screw(vBellowsScrew_d, vBellowsScrew_h);    
    
    // outer screw holes 
    // screws in x/-x direction    
    translate([vBellowsFrontFrameScrewHole_offsetX, vBellowsFrontFrameScrewHole_offsetY, vBellowsFrontFrameScrewHole_offsetZ])
        rotate([0, -90, 0])
            cylinder(d=vBellowsFrontFrameScrewHole_d, h=vBellowsFrontFrameScrewHole_h);
    translate([vBellowsFrontFrameScrewHole_offsetX, -vBellowsFrontFrameScrewHole_offsetY, vBellowsFrontFrameScrewHole_offsetZ])
        rotate([0, -90, 0])
            cylinder(d=vBellowsFrontFrameScrewHole_d, h=vBellowsFrontFrameScrewHole_h);
    translate([-vBellowsFrontFrameScrewHole_offsetX, vBellowsFrontFrameScrewHole_offsetY, vBellowsFrontFrameScrewHole_offsetZ])
        rotate([0, 90, 0])
            cylinder(d=vBellowsFrontFrameScrewHole_d, h=vBellowsFrontFrameScrewHole_h);
    translate([-vBellowsFrontFrameScrewHole_offsetX, -vBellowsFrontFrameScrewHole_offsetY, vBellowsFrontFrameScrewHole_offsetZ])
        rotate([0, 90, 0])
            cylinder(d=vBellowsFrontFrameScrewHole_d, h=vBellowsFrontFrameScrewHole_h);
    
    // screws in y/-y direction    
    translate([vBellowsFrontFrameScrewHole_offsetY, vBellowsFrontFrameScrewHole_offsetX, vBellowsFrontFrameScrewHole_offsetZ])
        rotate([90, 0, 0])
            cylinder(d=vBellowsFrontFrameScrewHole_d, h=vBellowsFrontFrameScrewHole_h);
    translate([vBellowsFrontFrameScrewHole_offsetY, -vBellowsFrontFrameScrewHole_offsetX, vBellowsFrontFrameScrewHole_offsetZ])
        rotate([-90, 0, 0])
            cylinder(d=vBellowsFrontFrameScrewHole_d, h=vBellowsFrontFrameScrewHole_h);
    translate([-vBellowsFrontFrameScrewHole_offsetY, vBellowsFrontFrameScrewHole_offsetX, vBellowsFrontFrameScrewHole_offsetZ])
        rotate([90, 0, 0])
            cylinder(d=vBellowsFrontFrameScrewHole_d, h=vBellowsFrontFrameScrewHole_h);
    translate([-vBellowsFrontFrameScrewHole_offsetY, -vBellowsFrontFrameScrewHole_offsetX, vBellowsFrontFrameScrewHole_offsetZ])
        rotate([-90, 0, 0])
            cylinder(d=vBellowsFrontFrameScrewHole_d, h=vBellowsFrontFrameScrewHole_h);        

}

};

bellows_front_frame();
